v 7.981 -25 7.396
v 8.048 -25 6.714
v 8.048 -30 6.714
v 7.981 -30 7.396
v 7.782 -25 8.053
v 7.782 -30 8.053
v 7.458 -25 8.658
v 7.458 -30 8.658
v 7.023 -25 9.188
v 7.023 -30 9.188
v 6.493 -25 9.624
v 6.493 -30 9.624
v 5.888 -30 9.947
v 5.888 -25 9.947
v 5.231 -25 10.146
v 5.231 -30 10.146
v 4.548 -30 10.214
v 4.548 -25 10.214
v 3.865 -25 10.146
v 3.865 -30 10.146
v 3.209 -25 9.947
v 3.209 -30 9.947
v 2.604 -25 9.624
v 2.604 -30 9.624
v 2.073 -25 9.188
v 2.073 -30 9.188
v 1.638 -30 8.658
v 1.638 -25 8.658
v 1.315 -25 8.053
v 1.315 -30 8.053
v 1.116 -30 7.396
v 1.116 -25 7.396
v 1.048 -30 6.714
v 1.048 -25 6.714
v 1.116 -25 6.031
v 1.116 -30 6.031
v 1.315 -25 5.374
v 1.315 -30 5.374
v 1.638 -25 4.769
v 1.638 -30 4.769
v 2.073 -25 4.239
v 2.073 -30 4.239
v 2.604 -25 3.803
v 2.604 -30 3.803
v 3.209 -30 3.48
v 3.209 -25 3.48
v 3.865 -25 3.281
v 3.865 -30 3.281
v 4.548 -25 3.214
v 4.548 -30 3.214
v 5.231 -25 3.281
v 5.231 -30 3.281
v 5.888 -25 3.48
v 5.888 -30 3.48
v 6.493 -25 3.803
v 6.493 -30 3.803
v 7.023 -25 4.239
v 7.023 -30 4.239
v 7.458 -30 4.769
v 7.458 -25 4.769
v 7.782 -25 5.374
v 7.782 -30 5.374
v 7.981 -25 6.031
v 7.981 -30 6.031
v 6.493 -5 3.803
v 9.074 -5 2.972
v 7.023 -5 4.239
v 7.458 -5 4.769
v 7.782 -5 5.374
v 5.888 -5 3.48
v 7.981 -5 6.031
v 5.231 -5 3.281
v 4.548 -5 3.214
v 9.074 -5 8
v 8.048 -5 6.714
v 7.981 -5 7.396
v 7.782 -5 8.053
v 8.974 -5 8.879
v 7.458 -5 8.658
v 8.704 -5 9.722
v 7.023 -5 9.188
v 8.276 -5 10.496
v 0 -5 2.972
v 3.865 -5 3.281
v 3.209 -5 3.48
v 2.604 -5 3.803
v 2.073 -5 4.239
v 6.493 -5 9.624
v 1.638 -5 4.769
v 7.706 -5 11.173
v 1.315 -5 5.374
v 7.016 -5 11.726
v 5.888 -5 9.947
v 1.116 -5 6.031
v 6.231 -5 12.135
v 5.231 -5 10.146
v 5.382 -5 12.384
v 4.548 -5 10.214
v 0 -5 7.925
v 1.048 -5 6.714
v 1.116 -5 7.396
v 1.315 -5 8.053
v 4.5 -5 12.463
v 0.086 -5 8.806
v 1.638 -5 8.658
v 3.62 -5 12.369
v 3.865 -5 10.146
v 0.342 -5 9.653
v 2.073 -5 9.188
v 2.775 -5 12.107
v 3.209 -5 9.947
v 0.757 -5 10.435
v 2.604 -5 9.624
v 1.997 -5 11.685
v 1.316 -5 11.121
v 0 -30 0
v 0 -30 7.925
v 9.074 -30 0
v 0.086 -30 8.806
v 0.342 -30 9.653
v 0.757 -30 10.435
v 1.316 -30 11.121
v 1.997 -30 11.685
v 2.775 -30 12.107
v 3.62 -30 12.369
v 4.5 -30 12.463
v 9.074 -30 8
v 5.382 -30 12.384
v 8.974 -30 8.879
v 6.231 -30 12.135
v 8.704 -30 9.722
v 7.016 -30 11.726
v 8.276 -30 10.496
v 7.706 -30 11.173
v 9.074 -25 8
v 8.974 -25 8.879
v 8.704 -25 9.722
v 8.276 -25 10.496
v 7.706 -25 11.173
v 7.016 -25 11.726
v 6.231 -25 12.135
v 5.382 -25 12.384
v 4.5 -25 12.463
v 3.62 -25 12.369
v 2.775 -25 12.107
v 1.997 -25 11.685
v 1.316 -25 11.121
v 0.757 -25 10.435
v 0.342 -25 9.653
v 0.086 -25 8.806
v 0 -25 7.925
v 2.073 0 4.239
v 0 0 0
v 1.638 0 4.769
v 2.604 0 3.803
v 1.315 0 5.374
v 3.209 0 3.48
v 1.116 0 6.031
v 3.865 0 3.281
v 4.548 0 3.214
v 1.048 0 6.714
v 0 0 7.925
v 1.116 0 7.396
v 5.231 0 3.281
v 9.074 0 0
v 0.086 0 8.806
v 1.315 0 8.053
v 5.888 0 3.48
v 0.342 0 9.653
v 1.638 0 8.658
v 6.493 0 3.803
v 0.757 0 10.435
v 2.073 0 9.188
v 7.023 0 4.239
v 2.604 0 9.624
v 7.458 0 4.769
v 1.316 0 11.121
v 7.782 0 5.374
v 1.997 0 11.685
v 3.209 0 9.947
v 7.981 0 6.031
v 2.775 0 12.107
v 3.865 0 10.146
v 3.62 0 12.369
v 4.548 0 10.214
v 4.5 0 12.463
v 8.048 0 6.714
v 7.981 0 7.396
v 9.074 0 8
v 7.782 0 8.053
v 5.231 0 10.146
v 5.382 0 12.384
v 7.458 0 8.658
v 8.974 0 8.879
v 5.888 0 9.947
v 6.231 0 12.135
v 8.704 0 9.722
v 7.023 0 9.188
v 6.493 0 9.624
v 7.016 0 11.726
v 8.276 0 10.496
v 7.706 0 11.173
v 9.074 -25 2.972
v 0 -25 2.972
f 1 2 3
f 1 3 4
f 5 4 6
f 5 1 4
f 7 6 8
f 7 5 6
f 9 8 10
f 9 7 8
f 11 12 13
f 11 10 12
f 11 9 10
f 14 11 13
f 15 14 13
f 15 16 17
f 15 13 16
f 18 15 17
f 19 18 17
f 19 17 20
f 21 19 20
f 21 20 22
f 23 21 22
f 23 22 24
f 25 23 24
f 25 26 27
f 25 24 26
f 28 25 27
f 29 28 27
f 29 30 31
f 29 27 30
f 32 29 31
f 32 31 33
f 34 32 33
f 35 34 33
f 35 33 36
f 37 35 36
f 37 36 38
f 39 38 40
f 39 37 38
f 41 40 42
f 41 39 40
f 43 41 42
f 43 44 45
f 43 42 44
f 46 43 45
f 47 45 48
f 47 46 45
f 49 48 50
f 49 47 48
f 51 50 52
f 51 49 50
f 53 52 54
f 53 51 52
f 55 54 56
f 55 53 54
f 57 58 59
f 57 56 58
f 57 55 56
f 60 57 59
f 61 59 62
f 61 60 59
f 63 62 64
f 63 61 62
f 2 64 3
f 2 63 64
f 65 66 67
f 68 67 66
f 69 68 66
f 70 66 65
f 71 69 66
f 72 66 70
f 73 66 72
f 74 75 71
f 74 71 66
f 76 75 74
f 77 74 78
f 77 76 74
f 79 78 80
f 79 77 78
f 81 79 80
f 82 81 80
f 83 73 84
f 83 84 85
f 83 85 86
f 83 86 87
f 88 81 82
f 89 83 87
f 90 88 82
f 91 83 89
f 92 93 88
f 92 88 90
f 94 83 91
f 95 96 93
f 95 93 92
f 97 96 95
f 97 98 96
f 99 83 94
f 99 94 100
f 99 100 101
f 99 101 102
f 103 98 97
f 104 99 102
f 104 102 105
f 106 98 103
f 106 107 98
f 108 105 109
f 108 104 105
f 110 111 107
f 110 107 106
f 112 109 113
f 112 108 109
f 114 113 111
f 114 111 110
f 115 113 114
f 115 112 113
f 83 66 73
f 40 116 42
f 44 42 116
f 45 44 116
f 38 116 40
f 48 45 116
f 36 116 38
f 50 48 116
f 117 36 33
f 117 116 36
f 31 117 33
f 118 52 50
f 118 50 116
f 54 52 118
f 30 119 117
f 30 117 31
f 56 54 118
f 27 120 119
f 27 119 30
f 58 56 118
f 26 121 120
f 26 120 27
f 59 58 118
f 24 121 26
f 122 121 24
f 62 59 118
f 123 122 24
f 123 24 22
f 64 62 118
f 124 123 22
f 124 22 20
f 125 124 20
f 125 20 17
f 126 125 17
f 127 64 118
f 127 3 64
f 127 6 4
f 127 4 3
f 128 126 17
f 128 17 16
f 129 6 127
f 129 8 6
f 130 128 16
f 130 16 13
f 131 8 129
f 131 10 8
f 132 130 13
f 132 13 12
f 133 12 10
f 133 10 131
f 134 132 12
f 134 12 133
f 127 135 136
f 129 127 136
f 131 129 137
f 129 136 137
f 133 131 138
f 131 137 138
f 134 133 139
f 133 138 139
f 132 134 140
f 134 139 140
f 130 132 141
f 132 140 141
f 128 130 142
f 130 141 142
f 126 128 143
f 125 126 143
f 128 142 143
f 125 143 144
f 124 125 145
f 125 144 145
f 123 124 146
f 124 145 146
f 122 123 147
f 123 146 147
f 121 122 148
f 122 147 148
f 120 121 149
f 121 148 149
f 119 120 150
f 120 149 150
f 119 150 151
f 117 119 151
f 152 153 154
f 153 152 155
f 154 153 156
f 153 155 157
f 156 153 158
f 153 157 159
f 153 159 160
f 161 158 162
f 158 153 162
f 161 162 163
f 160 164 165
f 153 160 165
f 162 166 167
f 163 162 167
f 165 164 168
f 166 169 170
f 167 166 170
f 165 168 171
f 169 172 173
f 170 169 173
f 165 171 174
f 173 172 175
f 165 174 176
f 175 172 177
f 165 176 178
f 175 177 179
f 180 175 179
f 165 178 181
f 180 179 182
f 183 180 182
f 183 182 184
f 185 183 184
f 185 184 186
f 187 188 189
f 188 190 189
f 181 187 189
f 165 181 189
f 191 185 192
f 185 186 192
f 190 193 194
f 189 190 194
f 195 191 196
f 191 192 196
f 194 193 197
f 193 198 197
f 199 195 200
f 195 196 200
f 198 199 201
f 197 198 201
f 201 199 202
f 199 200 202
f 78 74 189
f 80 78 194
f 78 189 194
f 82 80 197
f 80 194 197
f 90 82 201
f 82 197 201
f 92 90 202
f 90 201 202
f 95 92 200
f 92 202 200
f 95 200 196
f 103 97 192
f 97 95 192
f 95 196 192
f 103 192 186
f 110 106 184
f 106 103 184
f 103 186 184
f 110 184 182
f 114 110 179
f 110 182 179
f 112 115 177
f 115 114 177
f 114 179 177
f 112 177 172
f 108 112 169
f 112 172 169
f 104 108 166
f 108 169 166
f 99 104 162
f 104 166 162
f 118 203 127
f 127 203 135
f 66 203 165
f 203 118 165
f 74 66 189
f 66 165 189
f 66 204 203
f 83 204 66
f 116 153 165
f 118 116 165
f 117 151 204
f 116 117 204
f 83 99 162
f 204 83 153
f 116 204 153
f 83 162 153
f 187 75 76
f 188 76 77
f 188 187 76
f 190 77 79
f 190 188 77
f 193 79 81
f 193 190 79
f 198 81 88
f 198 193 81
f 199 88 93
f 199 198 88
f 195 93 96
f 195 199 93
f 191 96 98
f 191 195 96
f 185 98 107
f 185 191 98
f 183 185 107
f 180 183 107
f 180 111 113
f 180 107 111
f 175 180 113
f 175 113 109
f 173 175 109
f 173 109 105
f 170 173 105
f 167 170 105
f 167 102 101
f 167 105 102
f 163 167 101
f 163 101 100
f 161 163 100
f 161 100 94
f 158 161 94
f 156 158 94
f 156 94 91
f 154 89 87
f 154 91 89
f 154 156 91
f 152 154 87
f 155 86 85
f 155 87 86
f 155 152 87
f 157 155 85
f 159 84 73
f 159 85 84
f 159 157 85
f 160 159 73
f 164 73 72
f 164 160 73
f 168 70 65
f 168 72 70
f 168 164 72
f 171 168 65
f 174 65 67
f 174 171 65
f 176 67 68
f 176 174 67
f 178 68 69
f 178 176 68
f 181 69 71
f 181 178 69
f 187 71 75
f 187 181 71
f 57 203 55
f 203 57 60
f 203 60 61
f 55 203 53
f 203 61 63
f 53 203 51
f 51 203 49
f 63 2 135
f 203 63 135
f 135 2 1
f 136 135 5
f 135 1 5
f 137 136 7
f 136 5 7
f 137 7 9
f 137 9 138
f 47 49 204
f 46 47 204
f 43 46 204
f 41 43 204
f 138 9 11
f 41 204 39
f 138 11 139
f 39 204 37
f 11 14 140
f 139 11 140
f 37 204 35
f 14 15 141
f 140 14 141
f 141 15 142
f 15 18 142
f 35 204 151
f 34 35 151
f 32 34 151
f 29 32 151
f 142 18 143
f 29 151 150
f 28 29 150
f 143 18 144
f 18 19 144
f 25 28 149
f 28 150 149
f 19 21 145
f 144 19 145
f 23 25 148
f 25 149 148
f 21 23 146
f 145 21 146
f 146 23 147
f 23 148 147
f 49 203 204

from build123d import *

# Parameters (mm, degrees)
F1_DEPTH = 30
F2_R     = 3.5
F3_DEPTH = 30.001
F4_W     = 20
F4_H     = 10.027466
F5_DEPTH = 9.075462


with BuildPart() as f1:
    # F0 (on Front) → F1 (new body)
    with BuildSketch(Plane.XZ):
        with BuildLine():
            Line((0, 7.925374), (0, 0))
            Line((0, 0), (9.074462, 0))
            Line((9.074462, 0), (9.074462, 8))
            ThreePointArc((9.074462, 8), (4.500224, 12.462759), (0, 7.925374))
        make_face()
    extrude(amount=F1_DEPTH)

    # F2 (on Front) → F3 (cut, through all)
    with BuildSketch(Plane.XZ):
        with Locations((4.548298, 6.713609)):
            Circle(F2_R)
    extrude(amount=F3_DEPTH, mode=Mode.SUBTRACT)

    # F4 (on Right) → F5 (cut, through all)
    with BuildSketch(Plane.YZ):
        with Locations((-15, 7.985694)):
            Rectangle(F4_W, F4_H)
    extrude(amount=F5_DEPTH, mode=Mode.SUBTRACT)


solid = f1.part
